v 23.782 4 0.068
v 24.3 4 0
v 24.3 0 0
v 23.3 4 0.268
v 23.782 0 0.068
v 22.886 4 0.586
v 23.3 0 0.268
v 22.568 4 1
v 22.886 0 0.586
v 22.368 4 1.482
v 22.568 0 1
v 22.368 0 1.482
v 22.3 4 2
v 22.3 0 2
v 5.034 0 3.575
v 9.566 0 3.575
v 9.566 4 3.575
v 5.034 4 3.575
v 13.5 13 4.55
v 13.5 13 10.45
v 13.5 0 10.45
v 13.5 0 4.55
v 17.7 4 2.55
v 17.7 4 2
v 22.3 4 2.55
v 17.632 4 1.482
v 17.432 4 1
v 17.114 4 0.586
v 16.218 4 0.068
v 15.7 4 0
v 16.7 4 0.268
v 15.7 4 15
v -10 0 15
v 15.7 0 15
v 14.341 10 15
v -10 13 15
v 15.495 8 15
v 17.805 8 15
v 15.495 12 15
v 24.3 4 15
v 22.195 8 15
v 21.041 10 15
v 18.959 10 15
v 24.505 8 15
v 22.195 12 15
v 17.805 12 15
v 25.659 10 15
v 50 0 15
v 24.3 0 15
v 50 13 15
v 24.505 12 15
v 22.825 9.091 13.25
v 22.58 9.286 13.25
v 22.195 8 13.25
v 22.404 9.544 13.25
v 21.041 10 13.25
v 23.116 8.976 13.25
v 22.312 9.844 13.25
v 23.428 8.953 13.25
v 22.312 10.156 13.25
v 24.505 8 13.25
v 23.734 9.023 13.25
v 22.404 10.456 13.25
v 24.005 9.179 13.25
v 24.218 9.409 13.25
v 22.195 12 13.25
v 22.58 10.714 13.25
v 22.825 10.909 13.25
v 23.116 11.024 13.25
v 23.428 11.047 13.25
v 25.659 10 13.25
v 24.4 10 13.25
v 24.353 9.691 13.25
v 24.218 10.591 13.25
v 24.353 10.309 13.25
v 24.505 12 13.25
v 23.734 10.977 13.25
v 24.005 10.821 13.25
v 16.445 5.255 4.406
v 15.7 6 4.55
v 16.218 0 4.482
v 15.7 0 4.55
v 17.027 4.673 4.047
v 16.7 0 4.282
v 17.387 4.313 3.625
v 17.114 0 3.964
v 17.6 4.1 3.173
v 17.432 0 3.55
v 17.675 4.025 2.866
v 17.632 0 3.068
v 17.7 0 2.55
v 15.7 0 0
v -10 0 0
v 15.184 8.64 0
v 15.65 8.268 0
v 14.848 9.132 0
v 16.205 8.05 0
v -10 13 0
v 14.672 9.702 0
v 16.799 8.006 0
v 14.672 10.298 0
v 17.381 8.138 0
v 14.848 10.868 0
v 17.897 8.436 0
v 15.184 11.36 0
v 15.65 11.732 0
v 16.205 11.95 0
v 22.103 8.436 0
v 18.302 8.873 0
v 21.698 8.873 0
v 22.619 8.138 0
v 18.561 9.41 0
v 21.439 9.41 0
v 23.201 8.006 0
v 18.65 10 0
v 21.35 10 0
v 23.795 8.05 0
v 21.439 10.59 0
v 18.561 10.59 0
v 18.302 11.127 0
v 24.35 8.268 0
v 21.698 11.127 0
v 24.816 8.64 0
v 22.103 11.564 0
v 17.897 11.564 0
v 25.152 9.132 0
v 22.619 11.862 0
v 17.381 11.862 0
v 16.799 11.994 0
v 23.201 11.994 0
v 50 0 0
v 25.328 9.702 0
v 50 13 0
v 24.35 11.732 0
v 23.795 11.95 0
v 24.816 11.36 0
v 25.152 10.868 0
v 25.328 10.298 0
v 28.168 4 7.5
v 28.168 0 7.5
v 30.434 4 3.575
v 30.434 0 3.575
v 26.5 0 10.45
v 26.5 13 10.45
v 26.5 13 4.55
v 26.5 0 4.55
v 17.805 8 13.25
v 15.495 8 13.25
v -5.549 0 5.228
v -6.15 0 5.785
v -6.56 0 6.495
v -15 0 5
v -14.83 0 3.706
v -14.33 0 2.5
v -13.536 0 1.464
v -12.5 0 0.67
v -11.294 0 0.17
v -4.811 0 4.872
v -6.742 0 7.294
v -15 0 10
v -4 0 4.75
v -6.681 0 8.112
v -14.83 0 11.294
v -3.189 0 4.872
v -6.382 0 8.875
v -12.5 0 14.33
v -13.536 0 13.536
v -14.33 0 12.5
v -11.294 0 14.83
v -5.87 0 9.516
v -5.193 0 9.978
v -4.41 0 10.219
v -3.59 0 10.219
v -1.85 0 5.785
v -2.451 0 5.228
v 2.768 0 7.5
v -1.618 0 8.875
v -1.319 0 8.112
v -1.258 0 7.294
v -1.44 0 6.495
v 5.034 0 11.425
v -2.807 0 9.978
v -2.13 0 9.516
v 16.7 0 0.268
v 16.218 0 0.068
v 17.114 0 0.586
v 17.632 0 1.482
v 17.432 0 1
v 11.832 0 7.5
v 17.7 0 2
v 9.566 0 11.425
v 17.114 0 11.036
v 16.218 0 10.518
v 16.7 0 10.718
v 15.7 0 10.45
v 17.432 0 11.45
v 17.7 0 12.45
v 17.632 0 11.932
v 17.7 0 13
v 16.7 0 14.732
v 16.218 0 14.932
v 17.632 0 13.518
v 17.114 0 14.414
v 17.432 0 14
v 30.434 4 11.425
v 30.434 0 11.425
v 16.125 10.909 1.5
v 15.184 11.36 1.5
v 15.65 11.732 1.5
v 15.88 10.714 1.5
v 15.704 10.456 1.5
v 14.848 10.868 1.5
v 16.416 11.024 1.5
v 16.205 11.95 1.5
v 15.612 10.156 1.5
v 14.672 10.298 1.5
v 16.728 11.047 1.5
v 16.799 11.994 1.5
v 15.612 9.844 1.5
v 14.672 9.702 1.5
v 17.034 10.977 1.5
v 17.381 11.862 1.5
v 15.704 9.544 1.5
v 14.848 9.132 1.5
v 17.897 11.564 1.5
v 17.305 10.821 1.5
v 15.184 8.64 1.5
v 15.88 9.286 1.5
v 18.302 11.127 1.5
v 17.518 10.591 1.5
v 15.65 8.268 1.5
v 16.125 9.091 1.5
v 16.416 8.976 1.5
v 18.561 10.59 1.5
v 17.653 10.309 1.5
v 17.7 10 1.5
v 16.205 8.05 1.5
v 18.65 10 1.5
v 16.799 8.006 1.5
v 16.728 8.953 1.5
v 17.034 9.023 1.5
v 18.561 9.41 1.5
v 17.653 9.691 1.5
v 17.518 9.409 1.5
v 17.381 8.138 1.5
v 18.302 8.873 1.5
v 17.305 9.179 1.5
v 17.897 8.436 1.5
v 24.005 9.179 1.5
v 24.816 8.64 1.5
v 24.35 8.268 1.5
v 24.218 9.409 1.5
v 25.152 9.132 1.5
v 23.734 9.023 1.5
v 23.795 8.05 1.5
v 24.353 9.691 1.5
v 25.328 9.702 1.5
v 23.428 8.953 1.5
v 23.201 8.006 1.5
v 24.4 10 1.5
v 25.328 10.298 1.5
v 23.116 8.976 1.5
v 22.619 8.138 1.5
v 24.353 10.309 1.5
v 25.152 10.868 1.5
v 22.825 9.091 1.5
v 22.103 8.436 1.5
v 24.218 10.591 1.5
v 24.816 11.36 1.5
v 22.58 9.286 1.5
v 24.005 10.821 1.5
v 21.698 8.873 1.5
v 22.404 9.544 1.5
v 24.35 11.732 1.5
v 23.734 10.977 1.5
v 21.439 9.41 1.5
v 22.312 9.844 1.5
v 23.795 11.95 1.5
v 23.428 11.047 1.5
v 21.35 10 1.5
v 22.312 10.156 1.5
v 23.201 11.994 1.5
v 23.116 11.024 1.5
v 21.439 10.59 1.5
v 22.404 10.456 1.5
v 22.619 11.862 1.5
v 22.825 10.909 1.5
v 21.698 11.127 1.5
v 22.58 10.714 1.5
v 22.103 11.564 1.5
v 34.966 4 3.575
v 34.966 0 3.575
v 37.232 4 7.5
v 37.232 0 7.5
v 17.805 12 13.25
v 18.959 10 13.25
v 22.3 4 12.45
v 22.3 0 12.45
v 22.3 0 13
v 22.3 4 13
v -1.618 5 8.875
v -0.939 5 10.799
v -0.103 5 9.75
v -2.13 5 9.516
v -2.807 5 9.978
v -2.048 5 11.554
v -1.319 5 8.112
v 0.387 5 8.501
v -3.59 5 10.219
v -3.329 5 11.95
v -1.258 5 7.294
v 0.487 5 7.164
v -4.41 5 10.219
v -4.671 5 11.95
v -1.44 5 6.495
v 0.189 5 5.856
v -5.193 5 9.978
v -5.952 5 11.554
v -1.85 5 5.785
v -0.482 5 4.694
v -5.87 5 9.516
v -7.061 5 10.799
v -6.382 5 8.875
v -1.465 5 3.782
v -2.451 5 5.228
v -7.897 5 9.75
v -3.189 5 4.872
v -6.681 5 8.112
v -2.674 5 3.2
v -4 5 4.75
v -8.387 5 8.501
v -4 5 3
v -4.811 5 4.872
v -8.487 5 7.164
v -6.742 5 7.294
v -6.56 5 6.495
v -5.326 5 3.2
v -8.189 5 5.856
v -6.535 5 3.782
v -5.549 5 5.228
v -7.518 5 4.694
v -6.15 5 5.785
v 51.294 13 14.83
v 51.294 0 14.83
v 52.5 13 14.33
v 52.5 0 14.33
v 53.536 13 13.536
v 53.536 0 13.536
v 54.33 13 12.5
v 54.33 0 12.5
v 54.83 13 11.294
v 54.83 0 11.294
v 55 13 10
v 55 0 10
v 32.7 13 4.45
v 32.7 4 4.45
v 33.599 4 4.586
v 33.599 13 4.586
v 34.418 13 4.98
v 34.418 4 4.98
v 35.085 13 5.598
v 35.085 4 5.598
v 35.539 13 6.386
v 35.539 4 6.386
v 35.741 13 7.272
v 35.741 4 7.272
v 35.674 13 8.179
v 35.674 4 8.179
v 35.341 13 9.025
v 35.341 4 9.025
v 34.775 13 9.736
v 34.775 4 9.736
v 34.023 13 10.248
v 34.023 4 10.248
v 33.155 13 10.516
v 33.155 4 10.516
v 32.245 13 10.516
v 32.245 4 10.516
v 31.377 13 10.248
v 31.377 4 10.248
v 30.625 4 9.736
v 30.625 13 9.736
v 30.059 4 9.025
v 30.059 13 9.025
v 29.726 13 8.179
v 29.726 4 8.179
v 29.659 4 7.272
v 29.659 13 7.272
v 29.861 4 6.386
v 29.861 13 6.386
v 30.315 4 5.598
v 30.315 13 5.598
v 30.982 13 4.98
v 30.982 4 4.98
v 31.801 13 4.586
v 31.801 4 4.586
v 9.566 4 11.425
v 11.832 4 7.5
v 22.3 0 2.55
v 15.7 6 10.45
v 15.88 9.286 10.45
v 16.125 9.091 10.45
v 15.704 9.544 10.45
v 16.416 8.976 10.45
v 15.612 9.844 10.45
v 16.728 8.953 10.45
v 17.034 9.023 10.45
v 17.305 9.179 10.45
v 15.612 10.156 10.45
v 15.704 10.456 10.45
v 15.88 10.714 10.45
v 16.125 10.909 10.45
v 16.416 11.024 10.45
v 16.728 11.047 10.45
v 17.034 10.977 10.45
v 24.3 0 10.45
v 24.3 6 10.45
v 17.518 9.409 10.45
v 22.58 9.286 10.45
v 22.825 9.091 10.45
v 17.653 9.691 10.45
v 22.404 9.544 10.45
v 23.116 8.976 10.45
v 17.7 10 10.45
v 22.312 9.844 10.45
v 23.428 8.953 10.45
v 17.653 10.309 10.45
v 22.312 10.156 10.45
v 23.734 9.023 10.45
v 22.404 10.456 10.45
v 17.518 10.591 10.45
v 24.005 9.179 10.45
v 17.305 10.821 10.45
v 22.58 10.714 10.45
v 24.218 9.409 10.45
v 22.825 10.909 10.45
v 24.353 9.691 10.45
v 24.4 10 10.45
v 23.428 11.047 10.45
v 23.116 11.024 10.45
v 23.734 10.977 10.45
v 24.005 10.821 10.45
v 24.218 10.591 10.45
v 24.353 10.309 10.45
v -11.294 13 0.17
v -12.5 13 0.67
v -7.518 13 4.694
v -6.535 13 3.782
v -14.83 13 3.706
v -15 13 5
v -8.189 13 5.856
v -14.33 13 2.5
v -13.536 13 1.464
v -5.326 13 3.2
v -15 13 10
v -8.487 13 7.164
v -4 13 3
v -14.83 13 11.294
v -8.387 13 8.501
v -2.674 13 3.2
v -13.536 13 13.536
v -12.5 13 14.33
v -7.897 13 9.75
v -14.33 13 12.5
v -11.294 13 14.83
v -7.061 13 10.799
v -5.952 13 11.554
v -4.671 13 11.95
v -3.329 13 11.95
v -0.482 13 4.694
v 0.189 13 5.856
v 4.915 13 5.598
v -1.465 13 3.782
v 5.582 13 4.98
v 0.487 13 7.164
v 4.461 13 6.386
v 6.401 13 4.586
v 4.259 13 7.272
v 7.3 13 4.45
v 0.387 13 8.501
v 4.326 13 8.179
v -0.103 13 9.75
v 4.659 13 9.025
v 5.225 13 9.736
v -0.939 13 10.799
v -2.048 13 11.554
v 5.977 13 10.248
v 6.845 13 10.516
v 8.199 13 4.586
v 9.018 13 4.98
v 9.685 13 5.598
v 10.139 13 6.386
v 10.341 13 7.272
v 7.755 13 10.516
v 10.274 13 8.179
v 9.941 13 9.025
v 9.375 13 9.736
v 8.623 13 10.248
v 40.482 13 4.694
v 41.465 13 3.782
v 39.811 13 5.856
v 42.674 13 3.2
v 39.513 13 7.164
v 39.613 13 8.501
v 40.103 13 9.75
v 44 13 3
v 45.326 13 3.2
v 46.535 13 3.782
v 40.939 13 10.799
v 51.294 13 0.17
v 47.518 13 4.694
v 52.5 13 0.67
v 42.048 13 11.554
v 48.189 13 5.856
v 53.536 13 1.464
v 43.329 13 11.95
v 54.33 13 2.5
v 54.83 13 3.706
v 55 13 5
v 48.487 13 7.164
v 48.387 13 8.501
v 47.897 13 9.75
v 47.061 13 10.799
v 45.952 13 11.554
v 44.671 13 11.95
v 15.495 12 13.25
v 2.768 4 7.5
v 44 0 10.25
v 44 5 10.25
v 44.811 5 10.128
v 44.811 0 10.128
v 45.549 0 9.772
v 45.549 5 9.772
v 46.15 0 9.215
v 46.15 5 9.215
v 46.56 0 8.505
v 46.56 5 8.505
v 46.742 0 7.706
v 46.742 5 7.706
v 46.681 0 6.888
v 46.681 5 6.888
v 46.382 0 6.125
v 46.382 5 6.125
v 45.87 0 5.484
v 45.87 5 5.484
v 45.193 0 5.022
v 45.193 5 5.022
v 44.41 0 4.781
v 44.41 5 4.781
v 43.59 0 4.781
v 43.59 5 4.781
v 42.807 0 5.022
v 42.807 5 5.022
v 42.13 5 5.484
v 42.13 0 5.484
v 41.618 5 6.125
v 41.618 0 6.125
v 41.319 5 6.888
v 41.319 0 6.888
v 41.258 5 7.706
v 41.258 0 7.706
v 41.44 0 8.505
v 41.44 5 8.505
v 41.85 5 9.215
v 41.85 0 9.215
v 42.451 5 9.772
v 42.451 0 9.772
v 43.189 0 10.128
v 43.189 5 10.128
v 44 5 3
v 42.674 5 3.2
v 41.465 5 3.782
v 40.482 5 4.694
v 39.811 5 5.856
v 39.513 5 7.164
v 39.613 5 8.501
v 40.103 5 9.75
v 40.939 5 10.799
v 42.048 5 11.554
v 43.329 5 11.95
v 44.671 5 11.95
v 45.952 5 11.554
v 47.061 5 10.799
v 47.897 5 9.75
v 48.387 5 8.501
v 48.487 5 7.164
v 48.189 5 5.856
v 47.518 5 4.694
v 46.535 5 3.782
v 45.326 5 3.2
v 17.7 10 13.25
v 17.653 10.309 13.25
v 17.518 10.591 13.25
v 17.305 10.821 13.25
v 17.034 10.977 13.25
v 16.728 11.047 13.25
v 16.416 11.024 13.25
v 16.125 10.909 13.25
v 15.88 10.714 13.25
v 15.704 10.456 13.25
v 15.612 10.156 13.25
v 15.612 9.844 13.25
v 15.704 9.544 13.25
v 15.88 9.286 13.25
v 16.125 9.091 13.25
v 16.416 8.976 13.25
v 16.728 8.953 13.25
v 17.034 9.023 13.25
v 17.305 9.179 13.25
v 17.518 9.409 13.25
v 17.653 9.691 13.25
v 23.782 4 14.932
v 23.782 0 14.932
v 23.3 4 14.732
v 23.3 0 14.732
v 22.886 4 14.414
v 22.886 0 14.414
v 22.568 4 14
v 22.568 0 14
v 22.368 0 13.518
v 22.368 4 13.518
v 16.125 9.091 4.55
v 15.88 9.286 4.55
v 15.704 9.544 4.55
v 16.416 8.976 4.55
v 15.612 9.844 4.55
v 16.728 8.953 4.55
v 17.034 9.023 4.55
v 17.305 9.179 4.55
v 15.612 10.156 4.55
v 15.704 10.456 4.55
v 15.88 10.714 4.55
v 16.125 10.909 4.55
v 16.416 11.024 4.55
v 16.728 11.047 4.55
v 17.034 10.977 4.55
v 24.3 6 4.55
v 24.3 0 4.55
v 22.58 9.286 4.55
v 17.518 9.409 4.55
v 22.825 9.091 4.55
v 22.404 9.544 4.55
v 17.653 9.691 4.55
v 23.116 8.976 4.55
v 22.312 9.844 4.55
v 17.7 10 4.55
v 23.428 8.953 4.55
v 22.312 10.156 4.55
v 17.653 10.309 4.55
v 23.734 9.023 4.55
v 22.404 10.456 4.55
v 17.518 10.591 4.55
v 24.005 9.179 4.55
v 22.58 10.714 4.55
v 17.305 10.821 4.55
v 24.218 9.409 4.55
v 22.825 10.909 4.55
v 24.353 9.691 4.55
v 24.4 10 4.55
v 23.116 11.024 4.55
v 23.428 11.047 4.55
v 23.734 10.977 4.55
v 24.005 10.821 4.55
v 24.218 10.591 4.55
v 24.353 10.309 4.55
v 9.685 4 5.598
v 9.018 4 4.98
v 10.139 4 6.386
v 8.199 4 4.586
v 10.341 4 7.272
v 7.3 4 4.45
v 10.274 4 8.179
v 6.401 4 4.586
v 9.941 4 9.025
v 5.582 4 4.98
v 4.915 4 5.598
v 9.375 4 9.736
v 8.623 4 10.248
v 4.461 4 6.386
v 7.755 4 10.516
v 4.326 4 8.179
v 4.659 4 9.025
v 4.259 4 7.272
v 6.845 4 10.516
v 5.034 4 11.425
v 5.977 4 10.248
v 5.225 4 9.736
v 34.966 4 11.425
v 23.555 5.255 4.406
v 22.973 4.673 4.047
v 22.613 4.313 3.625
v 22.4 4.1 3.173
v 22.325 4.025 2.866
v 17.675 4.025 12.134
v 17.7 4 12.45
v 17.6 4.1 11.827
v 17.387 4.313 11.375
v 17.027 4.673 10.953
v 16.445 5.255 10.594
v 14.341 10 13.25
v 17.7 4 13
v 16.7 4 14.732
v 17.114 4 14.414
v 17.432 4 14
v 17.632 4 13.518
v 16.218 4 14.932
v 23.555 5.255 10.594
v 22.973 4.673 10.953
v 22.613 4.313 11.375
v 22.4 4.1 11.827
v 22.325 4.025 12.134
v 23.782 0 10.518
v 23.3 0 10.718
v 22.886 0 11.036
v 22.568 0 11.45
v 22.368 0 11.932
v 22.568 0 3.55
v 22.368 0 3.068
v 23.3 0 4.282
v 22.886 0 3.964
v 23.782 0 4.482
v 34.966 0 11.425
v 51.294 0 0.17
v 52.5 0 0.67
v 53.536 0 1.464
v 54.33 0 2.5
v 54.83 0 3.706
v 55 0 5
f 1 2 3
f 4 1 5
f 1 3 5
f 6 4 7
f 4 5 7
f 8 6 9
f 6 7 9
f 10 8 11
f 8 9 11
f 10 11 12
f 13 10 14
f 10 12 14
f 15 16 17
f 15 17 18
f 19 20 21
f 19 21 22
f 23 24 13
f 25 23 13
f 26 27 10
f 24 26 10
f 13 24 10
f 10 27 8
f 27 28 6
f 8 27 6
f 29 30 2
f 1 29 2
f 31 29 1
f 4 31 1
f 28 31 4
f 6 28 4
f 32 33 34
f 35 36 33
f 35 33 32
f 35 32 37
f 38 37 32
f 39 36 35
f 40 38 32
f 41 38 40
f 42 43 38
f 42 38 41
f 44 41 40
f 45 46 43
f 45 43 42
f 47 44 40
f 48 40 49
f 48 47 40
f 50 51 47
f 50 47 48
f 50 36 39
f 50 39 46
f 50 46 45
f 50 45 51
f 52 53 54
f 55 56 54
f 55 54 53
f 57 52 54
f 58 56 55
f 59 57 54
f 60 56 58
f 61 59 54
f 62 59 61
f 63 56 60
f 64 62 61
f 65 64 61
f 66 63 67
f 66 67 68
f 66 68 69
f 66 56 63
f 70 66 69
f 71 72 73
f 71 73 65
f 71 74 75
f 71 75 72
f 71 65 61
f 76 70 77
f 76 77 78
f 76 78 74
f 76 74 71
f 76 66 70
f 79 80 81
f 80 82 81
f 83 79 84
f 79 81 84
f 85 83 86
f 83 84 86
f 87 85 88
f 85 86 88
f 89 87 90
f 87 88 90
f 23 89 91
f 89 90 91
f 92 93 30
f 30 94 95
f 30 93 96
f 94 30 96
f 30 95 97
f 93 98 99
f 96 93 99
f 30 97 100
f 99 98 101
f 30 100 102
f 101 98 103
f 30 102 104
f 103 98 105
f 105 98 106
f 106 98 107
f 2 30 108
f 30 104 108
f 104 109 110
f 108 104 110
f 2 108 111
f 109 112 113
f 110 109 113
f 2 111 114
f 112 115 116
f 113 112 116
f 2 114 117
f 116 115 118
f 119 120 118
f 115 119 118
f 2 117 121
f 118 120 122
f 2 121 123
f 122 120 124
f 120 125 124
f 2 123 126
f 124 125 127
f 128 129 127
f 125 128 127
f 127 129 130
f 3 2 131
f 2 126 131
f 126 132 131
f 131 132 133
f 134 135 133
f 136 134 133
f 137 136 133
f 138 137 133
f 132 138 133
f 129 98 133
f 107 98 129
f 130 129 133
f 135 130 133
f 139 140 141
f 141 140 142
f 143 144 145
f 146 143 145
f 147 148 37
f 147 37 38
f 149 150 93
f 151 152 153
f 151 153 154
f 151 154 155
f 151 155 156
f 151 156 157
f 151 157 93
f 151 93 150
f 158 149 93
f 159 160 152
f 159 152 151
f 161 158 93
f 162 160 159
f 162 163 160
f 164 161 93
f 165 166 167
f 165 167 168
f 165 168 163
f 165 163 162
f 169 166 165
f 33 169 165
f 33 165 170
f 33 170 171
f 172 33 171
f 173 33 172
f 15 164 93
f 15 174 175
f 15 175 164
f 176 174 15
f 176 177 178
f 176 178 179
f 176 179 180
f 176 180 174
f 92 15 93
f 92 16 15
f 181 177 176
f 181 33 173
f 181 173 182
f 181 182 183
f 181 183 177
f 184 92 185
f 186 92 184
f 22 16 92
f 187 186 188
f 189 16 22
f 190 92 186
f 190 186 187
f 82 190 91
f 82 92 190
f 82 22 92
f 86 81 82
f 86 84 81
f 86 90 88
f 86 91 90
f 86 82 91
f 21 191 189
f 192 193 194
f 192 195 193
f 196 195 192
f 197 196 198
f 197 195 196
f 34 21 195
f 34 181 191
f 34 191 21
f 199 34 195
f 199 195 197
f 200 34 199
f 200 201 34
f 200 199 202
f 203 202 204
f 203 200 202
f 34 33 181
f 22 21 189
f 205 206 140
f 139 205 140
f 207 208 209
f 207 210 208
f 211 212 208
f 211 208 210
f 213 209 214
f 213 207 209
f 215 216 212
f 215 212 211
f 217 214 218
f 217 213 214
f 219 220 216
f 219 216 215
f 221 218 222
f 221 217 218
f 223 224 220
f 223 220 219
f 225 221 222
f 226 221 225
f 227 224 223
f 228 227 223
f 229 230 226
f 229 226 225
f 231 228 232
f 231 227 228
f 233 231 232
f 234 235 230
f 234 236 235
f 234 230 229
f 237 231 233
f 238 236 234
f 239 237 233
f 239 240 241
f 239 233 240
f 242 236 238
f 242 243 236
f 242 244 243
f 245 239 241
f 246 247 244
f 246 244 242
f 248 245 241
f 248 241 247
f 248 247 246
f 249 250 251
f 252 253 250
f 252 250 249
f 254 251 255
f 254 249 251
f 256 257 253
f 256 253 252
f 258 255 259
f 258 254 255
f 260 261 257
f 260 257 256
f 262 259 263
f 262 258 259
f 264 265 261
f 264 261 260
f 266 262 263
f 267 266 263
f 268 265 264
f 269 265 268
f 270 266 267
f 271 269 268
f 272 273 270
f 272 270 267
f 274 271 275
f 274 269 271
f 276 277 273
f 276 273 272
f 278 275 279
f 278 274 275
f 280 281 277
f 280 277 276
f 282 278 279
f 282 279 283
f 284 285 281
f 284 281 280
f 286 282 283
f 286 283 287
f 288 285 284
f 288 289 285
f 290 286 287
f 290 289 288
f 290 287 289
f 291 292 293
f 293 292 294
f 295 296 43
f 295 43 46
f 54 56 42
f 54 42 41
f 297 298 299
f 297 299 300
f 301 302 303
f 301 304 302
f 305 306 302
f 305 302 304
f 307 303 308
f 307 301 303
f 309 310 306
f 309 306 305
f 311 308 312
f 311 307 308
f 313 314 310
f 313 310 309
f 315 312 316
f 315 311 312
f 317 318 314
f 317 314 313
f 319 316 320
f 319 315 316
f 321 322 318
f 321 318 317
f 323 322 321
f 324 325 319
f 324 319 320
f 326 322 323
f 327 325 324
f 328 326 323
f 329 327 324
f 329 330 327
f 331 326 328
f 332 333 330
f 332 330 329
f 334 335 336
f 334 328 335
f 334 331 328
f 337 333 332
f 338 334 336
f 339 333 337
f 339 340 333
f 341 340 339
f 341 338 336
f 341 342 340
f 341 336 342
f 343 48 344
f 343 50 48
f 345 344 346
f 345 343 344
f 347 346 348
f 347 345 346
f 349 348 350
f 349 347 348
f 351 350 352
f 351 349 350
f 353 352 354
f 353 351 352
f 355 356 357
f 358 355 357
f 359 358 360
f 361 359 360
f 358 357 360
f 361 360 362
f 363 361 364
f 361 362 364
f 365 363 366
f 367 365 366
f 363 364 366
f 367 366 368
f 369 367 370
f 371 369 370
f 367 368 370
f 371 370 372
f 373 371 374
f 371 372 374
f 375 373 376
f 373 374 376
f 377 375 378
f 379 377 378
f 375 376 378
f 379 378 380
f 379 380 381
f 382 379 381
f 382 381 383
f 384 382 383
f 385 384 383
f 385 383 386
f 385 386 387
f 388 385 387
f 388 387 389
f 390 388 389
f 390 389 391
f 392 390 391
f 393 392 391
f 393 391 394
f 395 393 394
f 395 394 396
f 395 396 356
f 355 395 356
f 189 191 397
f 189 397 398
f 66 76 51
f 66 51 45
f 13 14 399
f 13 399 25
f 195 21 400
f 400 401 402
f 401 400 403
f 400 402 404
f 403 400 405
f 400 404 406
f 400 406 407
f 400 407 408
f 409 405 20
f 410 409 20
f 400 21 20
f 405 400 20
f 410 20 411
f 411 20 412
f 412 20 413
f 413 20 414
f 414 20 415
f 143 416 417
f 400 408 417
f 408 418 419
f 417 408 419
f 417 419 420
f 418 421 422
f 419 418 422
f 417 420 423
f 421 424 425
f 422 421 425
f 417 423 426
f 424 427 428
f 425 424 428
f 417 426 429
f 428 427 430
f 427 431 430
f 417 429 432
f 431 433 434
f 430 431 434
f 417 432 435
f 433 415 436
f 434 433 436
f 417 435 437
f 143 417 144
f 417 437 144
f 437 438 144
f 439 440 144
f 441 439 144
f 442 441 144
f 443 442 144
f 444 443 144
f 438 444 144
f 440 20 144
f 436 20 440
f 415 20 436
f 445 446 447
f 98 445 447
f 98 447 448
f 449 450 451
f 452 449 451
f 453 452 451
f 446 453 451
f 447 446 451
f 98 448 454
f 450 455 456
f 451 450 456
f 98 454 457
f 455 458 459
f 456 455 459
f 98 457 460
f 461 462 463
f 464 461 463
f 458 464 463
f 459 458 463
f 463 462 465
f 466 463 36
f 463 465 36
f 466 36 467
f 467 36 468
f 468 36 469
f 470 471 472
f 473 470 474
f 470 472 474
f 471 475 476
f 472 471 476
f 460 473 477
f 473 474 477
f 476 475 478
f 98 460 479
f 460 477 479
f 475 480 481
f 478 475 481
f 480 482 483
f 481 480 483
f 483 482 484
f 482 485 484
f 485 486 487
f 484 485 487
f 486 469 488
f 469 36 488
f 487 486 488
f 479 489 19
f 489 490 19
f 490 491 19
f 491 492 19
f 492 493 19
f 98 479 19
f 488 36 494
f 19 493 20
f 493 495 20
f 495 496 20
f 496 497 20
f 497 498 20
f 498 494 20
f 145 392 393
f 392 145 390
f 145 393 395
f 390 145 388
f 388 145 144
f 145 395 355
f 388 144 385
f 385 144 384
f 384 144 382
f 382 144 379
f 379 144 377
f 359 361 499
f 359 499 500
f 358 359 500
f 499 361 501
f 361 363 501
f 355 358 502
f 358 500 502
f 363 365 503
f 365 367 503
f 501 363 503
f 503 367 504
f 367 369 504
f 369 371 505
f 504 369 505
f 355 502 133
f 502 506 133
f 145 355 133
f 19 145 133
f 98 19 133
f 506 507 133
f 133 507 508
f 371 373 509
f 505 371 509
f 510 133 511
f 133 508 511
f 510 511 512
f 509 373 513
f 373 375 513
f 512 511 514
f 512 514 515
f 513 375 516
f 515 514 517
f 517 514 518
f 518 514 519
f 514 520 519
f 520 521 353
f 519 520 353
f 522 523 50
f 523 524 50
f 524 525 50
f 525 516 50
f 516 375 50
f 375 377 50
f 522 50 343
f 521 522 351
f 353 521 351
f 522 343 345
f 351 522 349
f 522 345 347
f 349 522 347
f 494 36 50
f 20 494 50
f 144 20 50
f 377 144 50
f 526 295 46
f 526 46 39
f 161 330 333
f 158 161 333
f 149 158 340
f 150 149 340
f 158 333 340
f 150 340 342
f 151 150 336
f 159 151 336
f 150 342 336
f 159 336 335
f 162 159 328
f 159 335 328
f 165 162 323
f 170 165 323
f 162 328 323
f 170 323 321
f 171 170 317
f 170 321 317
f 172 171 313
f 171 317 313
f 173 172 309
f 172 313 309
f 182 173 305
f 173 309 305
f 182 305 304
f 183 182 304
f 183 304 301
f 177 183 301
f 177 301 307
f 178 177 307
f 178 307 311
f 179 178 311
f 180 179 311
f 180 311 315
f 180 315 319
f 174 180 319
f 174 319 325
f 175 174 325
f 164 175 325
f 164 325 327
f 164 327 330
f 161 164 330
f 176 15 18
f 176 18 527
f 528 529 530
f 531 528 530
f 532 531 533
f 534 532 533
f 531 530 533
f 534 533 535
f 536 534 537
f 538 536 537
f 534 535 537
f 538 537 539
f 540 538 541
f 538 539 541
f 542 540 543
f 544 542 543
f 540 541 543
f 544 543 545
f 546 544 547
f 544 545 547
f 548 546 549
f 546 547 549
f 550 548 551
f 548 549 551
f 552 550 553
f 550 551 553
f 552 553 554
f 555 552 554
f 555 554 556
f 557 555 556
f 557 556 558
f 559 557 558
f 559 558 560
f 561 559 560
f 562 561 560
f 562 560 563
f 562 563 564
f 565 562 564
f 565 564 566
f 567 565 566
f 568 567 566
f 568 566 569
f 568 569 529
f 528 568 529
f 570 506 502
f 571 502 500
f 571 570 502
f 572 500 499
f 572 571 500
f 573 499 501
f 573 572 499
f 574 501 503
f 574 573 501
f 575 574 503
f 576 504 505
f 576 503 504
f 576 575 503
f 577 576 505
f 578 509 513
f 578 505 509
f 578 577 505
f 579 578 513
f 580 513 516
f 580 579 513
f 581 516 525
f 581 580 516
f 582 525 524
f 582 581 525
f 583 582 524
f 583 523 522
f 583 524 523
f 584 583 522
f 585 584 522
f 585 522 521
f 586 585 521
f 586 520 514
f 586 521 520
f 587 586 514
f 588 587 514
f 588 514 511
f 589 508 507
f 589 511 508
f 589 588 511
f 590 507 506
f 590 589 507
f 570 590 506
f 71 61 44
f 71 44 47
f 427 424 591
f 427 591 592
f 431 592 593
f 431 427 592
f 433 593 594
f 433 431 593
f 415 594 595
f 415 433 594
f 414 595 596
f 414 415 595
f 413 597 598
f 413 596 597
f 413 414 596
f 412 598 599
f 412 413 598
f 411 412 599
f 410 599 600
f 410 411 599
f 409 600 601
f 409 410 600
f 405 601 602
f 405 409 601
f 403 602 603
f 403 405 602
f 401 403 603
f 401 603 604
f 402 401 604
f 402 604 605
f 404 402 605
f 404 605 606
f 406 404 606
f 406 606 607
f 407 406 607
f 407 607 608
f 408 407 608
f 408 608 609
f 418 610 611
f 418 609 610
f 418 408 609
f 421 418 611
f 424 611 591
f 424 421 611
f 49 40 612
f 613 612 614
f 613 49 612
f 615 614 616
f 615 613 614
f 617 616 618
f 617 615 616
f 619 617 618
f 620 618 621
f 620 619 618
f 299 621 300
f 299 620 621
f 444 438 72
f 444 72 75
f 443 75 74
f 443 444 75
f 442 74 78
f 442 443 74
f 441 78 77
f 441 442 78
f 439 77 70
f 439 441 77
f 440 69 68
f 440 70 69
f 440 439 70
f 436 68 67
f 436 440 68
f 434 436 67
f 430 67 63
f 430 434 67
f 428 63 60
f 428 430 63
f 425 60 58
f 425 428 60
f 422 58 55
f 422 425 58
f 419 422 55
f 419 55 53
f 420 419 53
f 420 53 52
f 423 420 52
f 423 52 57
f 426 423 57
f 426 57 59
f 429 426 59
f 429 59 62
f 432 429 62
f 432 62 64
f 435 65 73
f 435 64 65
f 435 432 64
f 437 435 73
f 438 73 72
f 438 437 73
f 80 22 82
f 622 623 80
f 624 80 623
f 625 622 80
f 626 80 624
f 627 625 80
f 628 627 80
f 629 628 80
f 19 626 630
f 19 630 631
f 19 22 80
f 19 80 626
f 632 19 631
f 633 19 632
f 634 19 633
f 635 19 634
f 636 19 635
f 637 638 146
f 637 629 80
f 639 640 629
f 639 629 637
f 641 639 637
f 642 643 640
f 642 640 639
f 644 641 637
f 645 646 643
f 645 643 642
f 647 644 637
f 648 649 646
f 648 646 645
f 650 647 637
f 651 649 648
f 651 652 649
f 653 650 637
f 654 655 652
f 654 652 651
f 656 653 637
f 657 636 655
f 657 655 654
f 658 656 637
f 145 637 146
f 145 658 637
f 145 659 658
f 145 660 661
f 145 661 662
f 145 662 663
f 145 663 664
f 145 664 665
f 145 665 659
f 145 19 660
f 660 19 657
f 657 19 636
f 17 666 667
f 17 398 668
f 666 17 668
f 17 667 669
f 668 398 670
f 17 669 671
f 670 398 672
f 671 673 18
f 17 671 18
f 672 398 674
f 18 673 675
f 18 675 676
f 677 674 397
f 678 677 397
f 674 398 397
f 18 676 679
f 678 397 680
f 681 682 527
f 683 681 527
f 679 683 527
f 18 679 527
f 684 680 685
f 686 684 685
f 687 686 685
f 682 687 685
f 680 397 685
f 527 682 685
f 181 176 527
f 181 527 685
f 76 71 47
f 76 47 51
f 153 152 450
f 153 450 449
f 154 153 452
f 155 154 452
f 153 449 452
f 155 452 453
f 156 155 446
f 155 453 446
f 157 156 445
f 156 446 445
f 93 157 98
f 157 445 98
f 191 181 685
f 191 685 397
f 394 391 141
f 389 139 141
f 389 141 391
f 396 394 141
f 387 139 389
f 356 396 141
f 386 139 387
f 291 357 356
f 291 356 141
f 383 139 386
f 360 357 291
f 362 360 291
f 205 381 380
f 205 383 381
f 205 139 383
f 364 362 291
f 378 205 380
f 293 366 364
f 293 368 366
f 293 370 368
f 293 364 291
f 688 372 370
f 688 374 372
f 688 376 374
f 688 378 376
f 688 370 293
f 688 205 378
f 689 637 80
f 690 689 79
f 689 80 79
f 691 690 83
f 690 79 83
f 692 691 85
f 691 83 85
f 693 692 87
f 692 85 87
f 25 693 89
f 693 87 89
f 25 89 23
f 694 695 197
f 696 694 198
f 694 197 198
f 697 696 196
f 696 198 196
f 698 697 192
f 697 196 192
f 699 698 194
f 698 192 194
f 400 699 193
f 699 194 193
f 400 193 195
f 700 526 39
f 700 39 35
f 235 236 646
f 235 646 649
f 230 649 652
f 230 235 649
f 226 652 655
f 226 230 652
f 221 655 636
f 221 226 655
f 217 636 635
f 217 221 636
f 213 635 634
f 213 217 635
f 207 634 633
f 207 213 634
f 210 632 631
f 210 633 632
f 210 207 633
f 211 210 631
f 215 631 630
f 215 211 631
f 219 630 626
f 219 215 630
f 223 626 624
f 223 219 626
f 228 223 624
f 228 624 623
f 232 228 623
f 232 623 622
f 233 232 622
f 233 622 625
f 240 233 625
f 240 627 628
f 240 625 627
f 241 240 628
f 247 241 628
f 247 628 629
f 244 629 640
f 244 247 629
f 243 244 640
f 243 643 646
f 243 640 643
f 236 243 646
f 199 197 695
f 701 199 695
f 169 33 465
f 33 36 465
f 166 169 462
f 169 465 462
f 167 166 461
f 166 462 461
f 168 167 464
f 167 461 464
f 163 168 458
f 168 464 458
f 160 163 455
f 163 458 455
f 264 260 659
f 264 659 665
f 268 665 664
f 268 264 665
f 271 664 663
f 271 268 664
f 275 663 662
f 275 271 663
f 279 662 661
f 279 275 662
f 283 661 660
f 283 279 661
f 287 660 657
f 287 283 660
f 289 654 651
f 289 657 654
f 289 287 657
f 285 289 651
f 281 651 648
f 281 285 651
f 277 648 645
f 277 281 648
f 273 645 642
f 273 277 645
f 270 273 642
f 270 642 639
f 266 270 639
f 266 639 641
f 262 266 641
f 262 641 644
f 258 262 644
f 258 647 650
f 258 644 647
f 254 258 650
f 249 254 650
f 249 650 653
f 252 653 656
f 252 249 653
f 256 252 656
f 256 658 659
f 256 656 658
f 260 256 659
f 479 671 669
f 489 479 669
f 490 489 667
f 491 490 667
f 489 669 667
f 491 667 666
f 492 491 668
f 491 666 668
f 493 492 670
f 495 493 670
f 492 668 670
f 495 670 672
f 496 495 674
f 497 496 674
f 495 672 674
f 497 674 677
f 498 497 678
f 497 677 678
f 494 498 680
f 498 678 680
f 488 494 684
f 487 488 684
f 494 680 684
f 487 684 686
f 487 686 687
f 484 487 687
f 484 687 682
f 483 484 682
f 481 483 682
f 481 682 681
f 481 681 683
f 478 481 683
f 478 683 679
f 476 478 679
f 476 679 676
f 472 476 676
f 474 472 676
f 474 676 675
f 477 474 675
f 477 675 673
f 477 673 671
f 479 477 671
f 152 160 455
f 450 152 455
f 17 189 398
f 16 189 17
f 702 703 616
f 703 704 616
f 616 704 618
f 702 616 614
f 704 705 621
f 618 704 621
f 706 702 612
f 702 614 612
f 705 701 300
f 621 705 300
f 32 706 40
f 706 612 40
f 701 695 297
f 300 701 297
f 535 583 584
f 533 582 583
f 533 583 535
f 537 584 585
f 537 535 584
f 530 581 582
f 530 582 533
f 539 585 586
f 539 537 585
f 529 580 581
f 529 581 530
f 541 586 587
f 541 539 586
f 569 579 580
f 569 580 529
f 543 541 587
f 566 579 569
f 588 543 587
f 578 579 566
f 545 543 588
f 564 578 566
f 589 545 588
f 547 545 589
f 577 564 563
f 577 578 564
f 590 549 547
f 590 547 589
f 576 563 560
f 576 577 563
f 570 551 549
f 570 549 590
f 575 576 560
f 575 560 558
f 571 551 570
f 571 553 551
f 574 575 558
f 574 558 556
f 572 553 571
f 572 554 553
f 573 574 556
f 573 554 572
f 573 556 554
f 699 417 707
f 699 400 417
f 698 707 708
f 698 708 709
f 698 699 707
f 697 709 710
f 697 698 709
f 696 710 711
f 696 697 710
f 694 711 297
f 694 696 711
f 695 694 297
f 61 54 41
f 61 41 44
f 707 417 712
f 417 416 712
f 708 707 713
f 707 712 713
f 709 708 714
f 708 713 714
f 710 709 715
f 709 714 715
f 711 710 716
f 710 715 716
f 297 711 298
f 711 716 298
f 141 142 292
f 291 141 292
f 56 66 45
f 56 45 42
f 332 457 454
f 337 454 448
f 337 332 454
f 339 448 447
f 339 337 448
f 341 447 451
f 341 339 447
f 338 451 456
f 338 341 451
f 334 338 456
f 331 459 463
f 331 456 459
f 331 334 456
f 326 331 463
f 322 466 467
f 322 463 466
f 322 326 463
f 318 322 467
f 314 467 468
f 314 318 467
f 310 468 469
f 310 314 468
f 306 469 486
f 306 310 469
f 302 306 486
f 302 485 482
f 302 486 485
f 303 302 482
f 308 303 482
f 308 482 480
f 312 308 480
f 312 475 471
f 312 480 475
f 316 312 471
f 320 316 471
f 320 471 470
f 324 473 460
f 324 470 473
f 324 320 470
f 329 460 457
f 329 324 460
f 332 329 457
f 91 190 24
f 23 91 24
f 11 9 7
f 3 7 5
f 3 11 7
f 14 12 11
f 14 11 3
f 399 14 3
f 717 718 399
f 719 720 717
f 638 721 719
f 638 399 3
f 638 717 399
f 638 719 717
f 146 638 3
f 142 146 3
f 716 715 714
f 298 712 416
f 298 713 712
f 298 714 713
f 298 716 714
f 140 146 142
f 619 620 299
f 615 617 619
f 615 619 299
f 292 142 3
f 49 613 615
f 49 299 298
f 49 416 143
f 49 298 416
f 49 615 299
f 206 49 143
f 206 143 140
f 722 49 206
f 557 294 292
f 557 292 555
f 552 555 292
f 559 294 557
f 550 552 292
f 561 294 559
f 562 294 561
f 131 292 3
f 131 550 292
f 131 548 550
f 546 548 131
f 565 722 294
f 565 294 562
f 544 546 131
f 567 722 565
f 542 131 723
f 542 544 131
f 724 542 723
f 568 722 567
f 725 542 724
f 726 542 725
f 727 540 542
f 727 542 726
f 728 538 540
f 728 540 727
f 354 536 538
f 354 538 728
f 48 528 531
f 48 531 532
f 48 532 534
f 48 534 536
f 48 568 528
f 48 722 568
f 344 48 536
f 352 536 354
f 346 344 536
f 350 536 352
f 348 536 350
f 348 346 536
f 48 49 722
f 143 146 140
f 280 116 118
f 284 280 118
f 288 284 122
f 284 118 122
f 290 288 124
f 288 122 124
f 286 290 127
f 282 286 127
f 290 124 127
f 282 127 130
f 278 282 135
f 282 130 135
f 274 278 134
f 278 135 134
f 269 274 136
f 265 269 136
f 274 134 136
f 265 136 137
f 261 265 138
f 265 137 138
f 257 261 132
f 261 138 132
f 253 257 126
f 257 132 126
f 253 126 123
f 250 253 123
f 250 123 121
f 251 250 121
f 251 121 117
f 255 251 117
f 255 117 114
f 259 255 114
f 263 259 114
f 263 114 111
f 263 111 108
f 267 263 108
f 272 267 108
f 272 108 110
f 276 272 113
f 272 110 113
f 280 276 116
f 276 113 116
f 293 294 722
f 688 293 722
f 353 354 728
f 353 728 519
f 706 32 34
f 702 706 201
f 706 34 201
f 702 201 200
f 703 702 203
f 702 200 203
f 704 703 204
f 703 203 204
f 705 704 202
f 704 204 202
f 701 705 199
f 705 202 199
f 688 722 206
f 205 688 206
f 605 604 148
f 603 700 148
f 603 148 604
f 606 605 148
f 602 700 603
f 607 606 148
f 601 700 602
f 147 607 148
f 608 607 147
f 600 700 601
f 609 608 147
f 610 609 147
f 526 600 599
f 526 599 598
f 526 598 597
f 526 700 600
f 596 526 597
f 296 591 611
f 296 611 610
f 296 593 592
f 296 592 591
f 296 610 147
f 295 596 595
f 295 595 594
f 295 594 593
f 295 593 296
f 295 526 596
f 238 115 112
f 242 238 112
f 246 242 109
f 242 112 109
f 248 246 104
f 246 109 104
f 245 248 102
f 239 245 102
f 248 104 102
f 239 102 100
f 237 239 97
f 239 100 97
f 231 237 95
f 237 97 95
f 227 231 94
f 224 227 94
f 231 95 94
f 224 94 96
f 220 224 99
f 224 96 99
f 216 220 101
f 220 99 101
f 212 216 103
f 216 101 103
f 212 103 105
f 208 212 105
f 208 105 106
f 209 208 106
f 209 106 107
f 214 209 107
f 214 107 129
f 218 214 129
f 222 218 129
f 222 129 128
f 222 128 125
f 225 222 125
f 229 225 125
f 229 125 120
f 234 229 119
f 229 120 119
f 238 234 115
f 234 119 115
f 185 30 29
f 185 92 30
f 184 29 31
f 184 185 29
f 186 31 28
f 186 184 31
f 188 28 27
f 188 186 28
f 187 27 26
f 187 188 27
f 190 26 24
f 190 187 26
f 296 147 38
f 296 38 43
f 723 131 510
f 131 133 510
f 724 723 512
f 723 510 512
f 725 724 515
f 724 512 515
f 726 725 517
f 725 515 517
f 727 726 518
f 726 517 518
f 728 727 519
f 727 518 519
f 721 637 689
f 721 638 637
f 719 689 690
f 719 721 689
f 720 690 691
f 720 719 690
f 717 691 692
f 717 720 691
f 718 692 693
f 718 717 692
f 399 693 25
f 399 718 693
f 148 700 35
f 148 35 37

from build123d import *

# Parameters (mm, degrees)
SKETCH1_W                = 40
SKETCH1_H                = 13
SWITCHCASE_DEPTH         = 15
SKETCH2_W                = 13
SKETCH2_H                = 5.9
SWITCHCAVITY_DEPTH       = 45.654227124
SWITCHM2HOLES_DEPTH      = 44.338233697
SWITCHM2HOLES_DEPTH_BACK = 44.338233697
SKETCH3_R                = 1.05
SKETCH14_R               = 2
M2HEAD_DEPTH             = 1.5
M2NUTINSERTS_DEPTH       = 45.654227124
M2NUTINSERTS_DEPTH_BACK  = 1.75
SKETCH7_W                = 15
SKETCH7_H                = 13
WINGS_DEPTH              = 15
M5NUTS_DEPTH             = 4
SKETCH10_R               = 3.05
M6HOLE_DEPTH             = 59.472215624
WIRECHANNEL_DEPTH        = 58.473493891
WIRECHANNEL_DEPTH_BACK   = 58.473493891
SKETCH11_W               = 4.6
SKETCH11_H               = 4
CHANNELFILLET_R          = 2
M5HEAD_DEPTH             = 59.472215624
M5HEAD_DEPTH_BACK        = 8
SKETCH12_R               = 4.5
SKETCH13_R               = 2.75
M5THREAD_DEPTH           = 59.472215624
ENDFILLET_R              = 5


with BuildPart() as part:
    # Sketch1 → SwitchCase (new body)
    with BuildSketch(Plane.XY):
        with Locations((20, 6.5)):
            Rectangle(SKETCH1_W, SKETCH1_H)
    extrude(amount=SWITCHCASE_DEPTH)

    # Sketch2 → SwitchCavity (cut, through all)
    with BuildSketch(Plane(origin=(0, 13, 0), x_dir=(1, 0, 0), z_dir=(0, 1, 0))):
        with Locations((20, -7.5)):
            Rectangle(SKETCH2_W, SKETCH2_H)
    extrude(amount=-SWITCHCAVITY_DEPTH, mode=Mode.SUBTRACT)

    # Sketch3 → SwitchM2Holes (cut, two sides: drawn at the far end of the back side and taken through both)
    with BuildSketch(Plane.XY.offset(4.55).offset(-SWITCHM2HOLES_DEPTH_BACK)):
        with Locations((16.65, 10)):
            Circle(SKETCH3_R)
        with Locations((23.35, 10)):
            Circle(SKETCH3_R)
    extrude(amount=SWITCHM2HOLES_DEPTH + SWITCHM2HOLES_DEPTH_BACK, mode=Mode.SUBTRACT)

    # Sketch14 → M2Head (cut)
    with BuildSketch(Plane(origin=(0, 0, 0), x_dir=(-1, 0, 0), z_dir=(0, 0, -1))):
        with Locations((-23.35, 10)):
            Circle(SKETCH14_R)
        with Locations(Location((-16.65, 10, 0), (0, 0, 180))):
            Circle(SKETCH14_R)
    extrude(amount=-M2HEAD_DEPTH, mode=Mode.SUBTRACT)

    # Sketch5 → M2NutInserts (cut, two sides: drawn at the far end of the back side and taken through both)
    with BuildSketch(Plane.XY.offset(15).offset(-M2NUTINSERTS_DEPTH_BACK)):
        Polygon((18.959401077, 10), (17.804700538, 12), (15.495299462, 12), (14.340598923, 10), (15.495299462, 8), (17.804700538, 8), align=None)
        Polygon((25.659401077, 10), (24.504700538, 12), (22.195299462, 12), (21.040598923, 10), (22.195299462, 8), (24.504700538, 8), align=None)
    extrude(amount=M2NUTINSERTS_DEPTH + M2NUTINSERTS_DEPTH_BACK, mode=Mode.SUBTRACT)

    # Sketch7 → Wings (add)
    with BuildSketch(Plane.XY.offset(15)):
        with Locations((-7.5, 6.5)):
            Rectangle(SKETCH7_W, SKETCH7_H)
        with Locations((47.5, 6.5)):
            Rectangle(SKETCH7_W, SKETCH7_H)
    extrude(amount=-WINGS_DEPTH)

    # Sketch9 → M5Nuts (cut)
    with BuildSketch(Plane.XZ):
        Polygon((37.232199613, 7.5), (34.966099807, 11.425), (30.433900193, 11.425), (28.167800387, 7.5), (30.433900193, 3.575), (34.966099807, 3.575), align=None)
        Polygon((5.033900193, 3.575), (2.767800387, 7.5), (5.033900193, 11.425), (9.566099807, 11.425), (11.832199613, 7.5), (9.566099807, 3.575), align=None)
    extrude(amount=-M5NUTS_DEPTH, mode=Mode.SUBTRACT)

    # Sketch10 → M6Hole (cut, through all)
    with BuildSketch(Plane.XZ):
        with Locations(Location((7.3, 7.5, 0), (0, 0, 270))):
            Circle(SKETCH10_R)
        with Locations(Location((32.7, 7.5, 0), (0, 0, 270))):
            Circle(SKETCH10_R)
    extrude(amount=-M6HOLE_DEPTH, mode=Mode.SUBTRACT)

    # Sketch11 → WireChannel (cut, two sides: drawn at the far end of the back side and taken through both)
    with BuildSketch(Plane.XY.offset(4.55).offset(-WIRECHANNEL_DEPTH_BACK)):
        with Locations((20, 2)):
            Rectangle(SKETCH11_W, SKETCH11_H)
    extrude(amount=WIRECHANNEL_DEPTH + WIRECHANNEL_DEPTH_BACK, mode=Mode.SUBTRACT)

    # ChannelFillet
    channelfillet_edges = [part.edges().sort_by_distance(p)[0] for p in [
        (20, 4, 10.45),
        (17.7, 2, 10.45),
        (22.3, 2, 10.45),
        (22.3, 2, 4.55),
        (22.3, 2, 0),
        (17.7, 2, 4.55),
        (17.7, 2, 0),
        (20, 4, 4.55),
        (22.3, 2, 15),
        (17.7, 2, 15),
    ]]
    fillet(channelfillet_edges, radius=CHANNELFILLET_R)

    # Sketch12 → M5Head (cut, two sides: drawn at the far end of the back side and taken through both)
    with BuildSketch(Plane(origin=(0, 13, 0), x_dir=(1, 0, 0), z_dir=(0, 1, 0)).offset(-M5HEAD_DEPTH_BACK)):
        with Locations(Location((44, -7.5, 0), (0, 0, 90))):
            Circle(SKETCH12_R)
        with Locations(Location((-4, -7.5, 0), (0, 0, 90))):
            Circle(SKETCH12_R)
    extrude(amount=M5HEAD_DEPTH + M5HEAD_DEPTH_BACK, mode=Mode.SUBTRACT)

    # Sketch13 → M5Thread (cut, through all)
    with BuildSketch(Plane(origin=(0, 13, 0), x_dir=(1, 0, 0), z_dir=(0, 1, 0))):
        with Locations(Location((44, -7.5, 0), (0, 0, 270))):
            Circle(SKETCH13_R)
        with Locations(Location((-4, -7.5, 0), (0, 0, 90))):
            Circle(SKETCH13_R)
    extrude(amount=-M5THREAD_DEPTH, mode=Mode.SUBTRACT)

    # EndFillet
    endfillet_edges = [part.edges().sort_by_distance(p)[0] for p in [
        (-15, 6.5, 15),
        (-15, 6.5, 0),
        (55, 6.5, 15),
        (55, 6.5, 0),
    ]]
    fillet(endfillet_edges, radius=ENDFILLET_R)


solid = part.part
